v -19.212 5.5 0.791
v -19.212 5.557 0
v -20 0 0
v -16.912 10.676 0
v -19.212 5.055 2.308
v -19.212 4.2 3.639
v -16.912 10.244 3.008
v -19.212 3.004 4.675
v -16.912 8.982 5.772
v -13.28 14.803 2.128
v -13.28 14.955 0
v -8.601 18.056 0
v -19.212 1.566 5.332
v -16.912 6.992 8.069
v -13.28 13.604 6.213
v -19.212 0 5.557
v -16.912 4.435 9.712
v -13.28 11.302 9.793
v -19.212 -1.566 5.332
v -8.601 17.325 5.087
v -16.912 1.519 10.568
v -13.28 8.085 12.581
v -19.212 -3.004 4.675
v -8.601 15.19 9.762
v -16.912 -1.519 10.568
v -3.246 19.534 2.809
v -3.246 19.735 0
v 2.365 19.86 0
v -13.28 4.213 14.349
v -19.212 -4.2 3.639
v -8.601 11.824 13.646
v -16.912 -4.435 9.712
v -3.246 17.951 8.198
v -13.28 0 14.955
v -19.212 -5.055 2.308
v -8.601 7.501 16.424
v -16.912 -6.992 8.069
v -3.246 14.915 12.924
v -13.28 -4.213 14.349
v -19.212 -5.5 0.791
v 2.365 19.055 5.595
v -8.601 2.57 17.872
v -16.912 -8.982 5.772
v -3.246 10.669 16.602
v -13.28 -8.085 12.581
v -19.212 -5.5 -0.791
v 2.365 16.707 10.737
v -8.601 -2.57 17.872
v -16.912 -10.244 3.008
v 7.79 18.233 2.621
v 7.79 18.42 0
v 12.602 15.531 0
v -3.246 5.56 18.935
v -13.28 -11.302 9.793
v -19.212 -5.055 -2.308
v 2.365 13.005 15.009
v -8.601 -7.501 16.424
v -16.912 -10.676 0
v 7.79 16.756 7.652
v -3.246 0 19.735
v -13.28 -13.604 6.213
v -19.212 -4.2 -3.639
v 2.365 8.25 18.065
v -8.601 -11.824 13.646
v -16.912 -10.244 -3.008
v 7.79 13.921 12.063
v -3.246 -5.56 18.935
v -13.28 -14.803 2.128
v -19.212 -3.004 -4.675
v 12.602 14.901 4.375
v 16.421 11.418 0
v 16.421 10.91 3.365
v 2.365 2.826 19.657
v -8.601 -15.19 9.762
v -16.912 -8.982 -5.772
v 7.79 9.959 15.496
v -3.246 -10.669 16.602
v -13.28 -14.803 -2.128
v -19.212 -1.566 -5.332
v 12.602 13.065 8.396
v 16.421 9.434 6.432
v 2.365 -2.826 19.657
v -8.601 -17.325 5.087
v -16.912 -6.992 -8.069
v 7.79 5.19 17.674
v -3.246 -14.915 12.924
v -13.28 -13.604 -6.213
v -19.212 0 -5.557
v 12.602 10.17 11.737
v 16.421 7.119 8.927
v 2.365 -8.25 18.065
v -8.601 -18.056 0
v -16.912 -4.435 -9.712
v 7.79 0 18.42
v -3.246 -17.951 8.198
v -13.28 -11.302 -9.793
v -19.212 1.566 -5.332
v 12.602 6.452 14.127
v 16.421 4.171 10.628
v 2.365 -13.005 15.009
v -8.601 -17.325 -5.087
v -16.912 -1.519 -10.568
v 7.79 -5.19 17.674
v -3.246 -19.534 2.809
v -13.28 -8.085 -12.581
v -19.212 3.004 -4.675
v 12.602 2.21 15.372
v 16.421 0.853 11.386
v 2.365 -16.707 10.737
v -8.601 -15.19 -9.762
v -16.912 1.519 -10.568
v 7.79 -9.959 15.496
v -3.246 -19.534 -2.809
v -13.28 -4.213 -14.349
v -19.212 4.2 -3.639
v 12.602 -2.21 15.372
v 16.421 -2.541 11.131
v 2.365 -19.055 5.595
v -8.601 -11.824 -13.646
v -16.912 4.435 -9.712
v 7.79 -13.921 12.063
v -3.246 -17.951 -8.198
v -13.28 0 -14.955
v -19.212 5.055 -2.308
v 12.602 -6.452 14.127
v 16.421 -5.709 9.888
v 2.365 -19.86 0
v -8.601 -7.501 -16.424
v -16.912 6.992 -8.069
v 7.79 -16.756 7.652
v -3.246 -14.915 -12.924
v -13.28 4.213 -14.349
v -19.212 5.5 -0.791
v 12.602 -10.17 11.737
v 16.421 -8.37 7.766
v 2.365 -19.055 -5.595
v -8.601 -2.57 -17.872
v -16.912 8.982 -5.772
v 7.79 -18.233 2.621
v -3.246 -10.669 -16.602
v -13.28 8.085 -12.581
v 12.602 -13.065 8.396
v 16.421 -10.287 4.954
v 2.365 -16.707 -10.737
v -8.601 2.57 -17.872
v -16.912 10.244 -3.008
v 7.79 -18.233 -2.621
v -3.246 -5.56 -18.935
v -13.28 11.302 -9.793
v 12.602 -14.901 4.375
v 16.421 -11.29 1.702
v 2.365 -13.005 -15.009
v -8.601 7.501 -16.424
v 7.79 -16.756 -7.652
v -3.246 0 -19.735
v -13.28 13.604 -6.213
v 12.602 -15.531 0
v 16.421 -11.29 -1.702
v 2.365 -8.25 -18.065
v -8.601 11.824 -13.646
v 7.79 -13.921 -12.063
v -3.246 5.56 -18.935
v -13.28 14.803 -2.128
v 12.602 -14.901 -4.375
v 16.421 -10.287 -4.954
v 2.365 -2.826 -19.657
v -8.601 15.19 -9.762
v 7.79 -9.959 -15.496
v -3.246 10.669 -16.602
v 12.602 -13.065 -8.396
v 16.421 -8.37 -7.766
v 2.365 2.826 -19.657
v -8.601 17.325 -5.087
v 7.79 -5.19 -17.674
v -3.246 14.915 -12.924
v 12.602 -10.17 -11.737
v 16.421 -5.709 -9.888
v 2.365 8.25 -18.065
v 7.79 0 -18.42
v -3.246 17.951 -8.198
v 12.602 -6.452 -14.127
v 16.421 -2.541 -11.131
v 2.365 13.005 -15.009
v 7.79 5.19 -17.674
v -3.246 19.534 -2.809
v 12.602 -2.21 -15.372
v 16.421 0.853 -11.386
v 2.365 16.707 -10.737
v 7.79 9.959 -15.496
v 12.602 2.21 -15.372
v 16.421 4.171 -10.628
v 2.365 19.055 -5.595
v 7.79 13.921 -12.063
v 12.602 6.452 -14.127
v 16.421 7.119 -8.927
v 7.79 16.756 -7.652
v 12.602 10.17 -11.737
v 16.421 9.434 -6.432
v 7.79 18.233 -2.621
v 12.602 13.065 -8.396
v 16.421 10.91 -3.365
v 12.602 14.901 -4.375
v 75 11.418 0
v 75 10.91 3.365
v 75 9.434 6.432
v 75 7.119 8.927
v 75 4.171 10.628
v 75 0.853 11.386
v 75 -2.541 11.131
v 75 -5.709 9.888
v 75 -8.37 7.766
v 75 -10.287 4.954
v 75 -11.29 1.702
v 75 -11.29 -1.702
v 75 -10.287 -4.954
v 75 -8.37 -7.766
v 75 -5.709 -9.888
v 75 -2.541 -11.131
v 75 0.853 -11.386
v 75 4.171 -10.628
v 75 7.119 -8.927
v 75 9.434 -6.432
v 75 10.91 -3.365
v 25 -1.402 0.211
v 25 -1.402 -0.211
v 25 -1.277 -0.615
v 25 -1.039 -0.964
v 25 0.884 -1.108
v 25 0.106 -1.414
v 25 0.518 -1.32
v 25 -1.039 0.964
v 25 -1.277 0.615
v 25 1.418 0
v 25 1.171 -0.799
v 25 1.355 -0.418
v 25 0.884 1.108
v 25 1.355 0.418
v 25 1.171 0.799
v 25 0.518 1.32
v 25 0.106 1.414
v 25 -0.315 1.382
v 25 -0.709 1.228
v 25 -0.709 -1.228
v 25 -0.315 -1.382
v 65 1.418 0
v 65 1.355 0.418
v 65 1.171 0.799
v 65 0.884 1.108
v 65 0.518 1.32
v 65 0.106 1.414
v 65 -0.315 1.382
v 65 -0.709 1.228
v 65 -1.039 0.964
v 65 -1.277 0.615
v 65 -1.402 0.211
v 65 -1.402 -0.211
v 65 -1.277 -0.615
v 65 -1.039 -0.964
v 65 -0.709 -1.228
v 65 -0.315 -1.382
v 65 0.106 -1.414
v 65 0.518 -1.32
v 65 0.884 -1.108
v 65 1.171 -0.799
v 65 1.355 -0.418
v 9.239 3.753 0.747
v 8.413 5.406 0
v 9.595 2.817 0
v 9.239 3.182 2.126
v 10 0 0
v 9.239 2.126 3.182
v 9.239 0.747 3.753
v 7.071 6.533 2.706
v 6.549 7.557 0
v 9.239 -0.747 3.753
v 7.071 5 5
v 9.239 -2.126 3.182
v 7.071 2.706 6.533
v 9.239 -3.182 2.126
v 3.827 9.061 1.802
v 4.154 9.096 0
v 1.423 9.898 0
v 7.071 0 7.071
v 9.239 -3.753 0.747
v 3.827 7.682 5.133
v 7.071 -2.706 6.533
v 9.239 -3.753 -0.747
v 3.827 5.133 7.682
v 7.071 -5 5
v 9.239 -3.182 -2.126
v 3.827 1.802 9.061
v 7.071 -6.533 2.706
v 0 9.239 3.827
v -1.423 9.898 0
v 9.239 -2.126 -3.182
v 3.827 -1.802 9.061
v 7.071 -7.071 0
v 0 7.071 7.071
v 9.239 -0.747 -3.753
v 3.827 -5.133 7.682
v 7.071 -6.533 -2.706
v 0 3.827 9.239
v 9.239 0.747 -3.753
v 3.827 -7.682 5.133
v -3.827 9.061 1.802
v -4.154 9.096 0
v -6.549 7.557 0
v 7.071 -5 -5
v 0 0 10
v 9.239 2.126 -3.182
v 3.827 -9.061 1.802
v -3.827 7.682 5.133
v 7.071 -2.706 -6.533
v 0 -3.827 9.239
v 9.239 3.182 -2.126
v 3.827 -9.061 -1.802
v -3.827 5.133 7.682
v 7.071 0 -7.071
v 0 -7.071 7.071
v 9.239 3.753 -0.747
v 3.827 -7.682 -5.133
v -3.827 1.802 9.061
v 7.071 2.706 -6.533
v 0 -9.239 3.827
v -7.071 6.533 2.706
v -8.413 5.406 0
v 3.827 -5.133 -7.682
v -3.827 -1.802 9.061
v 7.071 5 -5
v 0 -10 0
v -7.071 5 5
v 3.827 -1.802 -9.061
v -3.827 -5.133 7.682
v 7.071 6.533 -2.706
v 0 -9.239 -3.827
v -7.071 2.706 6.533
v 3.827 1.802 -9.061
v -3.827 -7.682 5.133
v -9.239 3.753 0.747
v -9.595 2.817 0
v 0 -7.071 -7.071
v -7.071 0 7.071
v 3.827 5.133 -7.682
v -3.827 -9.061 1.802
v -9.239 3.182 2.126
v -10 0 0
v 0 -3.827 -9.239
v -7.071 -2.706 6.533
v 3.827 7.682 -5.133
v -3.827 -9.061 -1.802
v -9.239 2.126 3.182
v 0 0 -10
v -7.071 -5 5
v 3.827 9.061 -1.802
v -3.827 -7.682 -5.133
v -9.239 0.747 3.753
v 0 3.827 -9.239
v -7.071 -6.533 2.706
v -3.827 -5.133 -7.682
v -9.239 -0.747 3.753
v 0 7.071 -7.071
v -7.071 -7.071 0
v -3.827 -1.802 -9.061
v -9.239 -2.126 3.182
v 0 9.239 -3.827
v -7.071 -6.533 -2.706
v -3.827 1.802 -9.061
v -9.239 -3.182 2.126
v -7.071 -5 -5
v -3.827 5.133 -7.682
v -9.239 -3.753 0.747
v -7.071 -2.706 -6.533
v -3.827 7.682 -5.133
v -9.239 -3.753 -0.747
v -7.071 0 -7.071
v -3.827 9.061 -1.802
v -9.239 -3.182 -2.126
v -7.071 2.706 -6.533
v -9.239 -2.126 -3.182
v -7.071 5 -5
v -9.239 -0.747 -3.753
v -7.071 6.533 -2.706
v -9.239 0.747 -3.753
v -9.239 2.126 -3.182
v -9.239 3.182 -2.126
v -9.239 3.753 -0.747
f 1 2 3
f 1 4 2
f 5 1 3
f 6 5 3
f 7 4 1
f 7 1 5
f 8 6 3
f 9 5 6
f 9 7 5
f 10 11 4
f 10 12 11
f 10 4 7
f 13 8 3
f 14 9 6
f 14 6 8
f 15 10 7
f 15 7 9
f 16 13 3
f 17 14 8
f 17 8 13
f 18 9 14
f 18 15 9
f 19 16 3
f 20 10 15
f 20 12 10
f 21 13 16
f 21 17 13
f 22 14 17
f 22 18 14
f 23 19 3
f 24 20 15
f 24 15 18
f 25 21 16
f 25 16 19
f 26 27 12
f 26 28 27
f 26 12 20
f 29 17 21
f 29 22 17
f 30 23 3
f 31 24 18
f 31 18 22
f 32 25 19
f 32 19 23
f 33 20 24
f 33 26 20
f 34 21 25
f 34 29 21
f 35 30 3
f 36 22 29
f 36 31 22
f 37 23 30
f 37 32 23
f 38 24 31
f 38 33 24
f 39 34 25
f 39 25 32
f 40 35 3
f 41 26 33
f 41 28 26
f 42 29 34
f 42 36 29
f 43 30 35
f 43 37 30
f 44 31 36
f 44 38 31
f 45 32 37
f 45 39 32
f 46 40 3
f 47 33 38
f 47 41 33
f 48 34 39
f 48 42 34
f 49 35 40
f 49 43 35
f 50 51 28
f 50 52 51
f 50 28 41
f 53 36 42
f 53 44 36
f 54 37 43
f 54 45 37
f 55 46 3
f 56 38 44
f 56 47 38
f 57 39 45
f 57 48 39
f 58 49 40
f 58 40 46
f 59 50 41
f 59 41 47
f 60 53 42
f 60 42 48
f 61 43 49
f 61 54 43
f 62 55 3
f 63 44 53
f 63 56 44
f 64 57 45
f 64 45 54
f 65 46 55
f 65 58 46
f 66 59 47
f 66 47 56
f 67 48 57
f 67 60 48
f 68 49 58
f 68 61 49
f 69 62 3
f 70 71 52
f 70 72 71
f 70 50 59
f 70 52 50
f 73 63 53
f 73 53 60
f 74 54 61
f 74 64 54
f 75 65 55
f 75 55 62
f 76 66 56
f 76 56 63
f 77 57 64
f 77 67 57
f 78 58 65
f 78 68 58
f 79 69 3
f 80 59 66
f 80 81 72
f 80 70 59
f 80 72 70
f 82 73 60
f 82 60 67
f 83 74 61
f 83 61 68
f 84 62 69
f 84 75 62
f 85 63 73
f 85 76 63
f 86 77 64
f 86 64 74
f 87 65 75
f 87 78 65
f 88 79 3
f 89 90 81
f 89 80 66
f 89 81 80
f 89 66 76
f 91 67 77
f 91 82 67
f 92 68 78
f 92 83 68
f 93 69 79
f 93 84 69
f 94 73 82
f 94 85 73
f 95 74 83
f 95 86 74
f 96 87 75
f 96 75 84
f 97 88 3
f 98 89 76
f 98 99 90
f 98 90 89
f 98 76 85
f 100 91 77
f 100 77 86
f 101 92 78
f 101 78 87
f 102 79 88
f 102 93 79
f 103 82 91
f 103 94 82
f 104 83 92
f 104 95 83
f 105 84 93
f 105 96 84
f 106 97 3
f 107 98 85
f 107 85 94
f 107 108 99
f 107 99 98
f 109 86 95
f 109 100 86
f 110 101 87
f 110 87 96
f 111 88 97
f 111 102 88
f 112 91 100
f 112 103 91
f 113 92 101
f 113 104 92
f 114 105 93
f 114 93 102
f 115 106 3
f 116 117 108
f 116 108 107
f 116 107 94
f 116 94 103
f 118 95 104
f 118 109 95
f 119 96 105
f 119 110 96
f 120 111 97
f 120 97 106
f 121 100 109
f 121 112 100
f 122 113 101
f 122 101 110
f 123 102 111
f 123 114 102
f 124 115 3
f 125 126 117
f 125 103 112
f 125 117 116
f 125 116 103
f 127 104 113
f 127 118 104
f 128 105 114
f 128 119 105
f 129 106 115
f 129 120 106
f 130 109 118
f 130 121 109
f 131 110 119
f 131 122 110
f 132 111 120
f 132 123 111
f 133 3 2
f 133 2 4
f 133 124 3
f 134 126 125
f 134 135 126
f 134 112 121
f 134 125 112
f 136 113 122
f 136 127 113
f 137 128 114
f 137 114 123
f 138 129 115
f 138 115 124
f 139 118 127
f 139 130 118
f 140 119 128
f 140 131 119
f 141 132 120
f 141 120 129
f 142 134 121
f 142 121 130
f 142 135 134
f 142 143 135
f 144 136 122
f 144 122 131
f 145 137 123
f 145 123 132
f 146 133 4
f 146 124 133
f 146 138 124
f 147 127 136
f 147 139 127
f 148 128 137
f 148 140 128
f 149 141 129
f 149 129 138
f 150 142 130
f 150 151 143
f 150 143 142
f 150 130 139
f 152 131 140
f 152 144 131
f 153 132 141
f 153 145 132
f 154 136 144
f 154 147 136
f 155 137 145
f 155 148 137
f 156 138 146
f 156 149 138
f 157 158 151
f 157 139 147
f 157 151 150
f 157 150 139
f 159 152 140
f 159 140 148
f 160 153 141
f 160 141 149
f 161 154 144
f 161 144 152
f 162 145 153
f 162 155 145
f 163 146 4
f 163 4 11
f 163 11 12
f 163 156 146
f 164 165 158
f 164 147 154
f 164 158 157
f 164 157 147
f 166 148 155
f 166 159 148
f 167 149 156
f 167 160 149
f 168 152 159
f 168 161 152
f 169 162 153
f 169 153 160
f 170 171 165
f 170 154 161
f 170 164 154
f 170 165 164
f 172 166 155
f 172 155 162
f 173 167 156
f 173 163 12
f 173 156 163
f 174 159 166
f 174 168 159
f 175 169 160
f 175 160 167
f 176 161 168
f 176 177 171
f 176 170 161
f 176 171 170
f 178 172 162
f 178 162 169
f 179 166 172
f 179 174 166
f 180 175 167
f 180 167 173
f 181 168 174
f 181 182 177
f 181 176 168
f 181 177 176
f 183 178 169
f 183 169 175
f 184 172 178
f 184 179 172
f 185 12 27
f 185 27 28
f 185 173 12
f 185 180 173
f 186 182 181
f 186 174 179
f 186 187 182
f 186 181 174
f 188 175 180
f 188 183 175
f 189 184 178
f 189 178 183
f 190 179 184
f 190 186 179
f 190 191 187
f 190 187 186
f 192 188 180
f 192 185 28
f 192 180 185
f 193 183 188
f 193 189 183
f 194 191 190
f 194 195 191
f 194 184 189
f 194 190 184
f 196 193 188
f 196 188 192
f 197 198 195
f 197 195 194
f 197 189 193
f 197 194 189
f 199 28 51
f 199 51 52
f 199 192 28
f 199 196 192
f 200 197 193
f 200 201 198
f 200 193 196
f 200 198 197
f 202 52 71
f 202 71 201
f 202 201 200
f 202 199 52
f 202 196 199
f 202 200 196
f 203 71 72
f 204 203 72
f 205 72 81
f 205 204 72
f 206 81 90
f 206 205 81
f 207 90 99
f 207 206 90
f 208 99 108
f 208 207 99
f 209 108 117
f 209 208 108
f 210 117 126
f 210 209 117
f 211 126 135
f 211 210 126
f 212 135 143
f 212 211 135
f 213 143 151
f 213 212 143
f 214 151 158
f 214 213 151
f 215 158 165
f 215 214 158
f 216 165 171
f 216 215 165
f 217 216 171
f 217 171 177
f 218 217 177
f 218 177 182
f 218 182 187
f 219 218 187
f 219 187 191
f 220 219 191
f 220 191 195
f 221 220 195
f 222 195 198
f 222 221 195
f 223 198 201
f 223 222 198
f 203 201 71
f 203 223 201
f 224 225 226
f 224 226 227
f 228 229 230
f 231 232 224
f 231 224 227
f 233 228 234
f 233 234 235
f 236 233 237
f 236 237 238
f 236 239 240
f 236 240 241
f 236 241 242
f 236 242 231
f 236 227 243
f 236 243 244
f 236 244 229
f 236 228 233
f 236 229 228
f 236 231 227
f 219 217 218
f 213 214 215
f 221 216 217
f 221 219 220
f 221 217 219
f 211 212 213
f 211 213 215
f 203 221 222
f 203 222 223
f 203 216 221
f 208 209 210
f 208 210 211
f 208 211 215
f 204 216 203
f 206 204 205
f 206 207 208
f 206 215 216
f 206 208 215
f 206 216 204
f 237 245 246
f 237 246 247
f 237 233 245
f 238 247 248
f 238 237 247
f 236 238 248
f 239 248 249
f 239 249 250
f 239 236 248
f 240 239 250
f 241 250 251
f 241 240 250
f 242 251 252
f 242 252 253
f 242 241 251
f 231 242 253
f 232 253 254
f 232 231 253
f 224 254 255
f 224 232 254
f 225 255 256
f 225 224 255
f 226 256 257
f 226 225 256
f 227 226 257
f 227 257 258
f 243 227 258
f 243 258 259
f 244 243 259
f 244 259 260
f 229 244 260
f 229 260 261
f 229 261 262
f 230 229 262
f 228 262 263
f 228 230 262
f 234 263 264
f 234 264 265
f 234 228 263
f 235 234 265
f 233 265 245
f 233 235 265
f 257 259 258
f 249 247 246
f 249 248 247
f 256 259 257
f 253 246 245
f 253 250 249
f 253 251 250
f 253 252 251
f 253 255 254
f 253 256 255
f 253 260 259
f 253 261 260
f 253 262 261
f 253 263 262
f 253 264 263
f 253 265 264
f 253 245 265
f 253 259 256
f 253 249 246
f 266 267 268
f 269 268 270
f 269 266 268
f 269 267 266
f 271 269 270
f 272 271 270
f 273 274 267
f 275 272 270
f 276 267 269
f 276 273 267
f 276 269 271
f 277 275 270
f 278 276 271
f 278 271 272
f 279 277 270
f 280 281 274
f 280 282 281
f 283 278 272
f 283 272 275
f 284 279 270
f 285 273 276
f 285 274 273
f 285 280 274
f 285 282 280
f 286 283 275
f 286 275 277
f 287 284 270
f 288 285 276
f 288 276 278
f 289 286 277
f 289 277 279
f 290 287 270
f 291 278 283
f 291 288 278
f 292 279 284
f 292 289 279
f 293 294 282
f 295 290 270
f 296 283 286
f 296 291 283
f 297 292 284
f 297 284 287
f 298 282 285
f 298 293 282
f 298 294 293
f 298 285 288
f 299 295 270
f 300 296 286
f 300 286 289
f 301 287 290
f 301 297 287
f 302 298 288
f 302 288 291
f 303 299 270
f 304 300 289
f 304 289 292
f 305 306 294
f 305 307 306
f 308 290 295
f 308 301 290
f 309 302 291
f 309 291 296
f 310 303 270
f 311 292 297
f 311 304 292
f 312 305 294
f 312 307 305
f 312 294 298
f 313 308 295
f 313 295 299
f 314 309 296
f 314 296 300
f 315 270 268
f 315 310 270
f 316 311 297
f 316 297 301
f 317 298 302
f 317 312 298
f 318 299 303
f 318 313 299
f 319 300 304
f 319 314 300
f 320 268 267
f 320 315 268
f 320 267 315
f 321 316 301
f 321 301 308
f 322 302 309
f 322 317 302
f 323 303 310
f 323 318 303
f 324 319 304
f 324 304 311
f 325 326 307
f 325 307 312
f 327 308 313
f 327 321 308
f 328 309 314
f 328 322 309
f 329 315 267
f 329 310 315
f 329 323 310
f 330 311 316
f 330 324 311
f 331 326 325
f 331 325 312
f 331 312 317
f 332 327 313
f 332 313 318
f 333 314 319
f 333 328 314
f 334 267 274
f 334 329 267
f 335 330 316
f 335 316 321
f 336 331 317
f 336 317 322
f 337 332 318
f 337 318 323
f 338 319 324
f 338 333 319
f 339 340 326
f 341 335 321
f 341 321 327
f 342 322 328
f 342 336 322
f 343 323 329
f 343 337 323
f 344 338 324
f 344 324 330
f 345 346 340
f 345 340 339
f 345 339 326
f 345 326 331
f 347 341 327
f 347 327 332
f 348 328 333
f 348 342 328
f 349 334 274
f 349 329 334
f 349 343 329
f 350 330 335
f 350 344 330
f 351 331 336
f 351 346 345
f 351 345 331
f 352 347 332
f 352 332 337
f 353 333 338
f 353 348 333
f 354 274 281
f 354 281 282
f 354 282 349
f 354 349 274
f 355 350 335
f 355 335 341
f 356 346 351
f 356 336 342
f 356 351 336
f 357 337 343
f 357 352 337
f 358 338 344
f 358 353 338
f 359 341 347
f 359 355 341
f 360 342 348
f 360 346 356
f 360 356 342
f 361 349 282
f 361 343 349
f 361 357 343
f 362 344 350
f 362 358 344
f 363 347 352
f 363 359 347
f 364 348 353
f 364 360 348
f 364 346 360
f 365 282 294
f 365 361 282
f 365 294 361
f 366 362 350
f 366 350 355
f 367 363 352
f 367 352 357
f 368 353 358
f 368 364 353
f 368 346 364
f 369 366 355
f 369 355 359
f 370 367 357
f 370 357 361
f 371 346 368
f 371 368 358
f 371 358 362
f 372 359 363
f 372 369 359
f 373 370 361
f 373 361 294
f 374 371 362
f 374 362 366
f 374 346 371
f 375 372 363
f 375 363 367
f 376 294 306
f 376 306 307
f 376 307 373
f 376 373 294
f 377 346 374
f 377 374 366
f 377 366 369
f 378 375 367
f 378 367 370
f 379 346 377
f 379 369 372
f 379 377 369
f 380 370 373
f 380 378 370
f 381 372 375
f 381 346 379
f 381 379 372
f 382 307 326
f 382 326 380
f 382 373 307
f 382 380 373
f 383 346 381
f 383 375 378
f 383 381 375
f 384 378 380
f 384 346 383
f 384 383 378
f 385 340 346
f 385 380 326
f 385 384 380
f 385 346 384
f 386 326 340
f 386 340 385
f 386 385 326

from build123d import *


with BuildPart() as part:
    # Sketch2 → Revolve-Thin1 (revolve)
    with BuildSketch(Plane.XY):
        with BuildLine():
            ThreePointArc((10, 0), (0, 10), (-10, 0))
            Line((-10, 0), (-20, 0))
            ThreePointArc((-20, 0), (0, 20), (20, 0))
            Line((20, 0), (10, 0))
        make_face()
    revolve(axis=Axis((-10, 0, 0), (1, 0, 0)))

    # Sketch3 → Revolve-Thin2 (revolve)
    with BuildSketch(Plane.XY):
        Polygon((15, 0), (15, 11.417573163), (75, 11.417573163), (75, 0), (65, 0), (65, 1.417573163), (25, 1.417573163), (25, 0), align=None)
    revolve(axis=Axis((15, 0, 0), (1, 0, 0)))


solid = part.part
